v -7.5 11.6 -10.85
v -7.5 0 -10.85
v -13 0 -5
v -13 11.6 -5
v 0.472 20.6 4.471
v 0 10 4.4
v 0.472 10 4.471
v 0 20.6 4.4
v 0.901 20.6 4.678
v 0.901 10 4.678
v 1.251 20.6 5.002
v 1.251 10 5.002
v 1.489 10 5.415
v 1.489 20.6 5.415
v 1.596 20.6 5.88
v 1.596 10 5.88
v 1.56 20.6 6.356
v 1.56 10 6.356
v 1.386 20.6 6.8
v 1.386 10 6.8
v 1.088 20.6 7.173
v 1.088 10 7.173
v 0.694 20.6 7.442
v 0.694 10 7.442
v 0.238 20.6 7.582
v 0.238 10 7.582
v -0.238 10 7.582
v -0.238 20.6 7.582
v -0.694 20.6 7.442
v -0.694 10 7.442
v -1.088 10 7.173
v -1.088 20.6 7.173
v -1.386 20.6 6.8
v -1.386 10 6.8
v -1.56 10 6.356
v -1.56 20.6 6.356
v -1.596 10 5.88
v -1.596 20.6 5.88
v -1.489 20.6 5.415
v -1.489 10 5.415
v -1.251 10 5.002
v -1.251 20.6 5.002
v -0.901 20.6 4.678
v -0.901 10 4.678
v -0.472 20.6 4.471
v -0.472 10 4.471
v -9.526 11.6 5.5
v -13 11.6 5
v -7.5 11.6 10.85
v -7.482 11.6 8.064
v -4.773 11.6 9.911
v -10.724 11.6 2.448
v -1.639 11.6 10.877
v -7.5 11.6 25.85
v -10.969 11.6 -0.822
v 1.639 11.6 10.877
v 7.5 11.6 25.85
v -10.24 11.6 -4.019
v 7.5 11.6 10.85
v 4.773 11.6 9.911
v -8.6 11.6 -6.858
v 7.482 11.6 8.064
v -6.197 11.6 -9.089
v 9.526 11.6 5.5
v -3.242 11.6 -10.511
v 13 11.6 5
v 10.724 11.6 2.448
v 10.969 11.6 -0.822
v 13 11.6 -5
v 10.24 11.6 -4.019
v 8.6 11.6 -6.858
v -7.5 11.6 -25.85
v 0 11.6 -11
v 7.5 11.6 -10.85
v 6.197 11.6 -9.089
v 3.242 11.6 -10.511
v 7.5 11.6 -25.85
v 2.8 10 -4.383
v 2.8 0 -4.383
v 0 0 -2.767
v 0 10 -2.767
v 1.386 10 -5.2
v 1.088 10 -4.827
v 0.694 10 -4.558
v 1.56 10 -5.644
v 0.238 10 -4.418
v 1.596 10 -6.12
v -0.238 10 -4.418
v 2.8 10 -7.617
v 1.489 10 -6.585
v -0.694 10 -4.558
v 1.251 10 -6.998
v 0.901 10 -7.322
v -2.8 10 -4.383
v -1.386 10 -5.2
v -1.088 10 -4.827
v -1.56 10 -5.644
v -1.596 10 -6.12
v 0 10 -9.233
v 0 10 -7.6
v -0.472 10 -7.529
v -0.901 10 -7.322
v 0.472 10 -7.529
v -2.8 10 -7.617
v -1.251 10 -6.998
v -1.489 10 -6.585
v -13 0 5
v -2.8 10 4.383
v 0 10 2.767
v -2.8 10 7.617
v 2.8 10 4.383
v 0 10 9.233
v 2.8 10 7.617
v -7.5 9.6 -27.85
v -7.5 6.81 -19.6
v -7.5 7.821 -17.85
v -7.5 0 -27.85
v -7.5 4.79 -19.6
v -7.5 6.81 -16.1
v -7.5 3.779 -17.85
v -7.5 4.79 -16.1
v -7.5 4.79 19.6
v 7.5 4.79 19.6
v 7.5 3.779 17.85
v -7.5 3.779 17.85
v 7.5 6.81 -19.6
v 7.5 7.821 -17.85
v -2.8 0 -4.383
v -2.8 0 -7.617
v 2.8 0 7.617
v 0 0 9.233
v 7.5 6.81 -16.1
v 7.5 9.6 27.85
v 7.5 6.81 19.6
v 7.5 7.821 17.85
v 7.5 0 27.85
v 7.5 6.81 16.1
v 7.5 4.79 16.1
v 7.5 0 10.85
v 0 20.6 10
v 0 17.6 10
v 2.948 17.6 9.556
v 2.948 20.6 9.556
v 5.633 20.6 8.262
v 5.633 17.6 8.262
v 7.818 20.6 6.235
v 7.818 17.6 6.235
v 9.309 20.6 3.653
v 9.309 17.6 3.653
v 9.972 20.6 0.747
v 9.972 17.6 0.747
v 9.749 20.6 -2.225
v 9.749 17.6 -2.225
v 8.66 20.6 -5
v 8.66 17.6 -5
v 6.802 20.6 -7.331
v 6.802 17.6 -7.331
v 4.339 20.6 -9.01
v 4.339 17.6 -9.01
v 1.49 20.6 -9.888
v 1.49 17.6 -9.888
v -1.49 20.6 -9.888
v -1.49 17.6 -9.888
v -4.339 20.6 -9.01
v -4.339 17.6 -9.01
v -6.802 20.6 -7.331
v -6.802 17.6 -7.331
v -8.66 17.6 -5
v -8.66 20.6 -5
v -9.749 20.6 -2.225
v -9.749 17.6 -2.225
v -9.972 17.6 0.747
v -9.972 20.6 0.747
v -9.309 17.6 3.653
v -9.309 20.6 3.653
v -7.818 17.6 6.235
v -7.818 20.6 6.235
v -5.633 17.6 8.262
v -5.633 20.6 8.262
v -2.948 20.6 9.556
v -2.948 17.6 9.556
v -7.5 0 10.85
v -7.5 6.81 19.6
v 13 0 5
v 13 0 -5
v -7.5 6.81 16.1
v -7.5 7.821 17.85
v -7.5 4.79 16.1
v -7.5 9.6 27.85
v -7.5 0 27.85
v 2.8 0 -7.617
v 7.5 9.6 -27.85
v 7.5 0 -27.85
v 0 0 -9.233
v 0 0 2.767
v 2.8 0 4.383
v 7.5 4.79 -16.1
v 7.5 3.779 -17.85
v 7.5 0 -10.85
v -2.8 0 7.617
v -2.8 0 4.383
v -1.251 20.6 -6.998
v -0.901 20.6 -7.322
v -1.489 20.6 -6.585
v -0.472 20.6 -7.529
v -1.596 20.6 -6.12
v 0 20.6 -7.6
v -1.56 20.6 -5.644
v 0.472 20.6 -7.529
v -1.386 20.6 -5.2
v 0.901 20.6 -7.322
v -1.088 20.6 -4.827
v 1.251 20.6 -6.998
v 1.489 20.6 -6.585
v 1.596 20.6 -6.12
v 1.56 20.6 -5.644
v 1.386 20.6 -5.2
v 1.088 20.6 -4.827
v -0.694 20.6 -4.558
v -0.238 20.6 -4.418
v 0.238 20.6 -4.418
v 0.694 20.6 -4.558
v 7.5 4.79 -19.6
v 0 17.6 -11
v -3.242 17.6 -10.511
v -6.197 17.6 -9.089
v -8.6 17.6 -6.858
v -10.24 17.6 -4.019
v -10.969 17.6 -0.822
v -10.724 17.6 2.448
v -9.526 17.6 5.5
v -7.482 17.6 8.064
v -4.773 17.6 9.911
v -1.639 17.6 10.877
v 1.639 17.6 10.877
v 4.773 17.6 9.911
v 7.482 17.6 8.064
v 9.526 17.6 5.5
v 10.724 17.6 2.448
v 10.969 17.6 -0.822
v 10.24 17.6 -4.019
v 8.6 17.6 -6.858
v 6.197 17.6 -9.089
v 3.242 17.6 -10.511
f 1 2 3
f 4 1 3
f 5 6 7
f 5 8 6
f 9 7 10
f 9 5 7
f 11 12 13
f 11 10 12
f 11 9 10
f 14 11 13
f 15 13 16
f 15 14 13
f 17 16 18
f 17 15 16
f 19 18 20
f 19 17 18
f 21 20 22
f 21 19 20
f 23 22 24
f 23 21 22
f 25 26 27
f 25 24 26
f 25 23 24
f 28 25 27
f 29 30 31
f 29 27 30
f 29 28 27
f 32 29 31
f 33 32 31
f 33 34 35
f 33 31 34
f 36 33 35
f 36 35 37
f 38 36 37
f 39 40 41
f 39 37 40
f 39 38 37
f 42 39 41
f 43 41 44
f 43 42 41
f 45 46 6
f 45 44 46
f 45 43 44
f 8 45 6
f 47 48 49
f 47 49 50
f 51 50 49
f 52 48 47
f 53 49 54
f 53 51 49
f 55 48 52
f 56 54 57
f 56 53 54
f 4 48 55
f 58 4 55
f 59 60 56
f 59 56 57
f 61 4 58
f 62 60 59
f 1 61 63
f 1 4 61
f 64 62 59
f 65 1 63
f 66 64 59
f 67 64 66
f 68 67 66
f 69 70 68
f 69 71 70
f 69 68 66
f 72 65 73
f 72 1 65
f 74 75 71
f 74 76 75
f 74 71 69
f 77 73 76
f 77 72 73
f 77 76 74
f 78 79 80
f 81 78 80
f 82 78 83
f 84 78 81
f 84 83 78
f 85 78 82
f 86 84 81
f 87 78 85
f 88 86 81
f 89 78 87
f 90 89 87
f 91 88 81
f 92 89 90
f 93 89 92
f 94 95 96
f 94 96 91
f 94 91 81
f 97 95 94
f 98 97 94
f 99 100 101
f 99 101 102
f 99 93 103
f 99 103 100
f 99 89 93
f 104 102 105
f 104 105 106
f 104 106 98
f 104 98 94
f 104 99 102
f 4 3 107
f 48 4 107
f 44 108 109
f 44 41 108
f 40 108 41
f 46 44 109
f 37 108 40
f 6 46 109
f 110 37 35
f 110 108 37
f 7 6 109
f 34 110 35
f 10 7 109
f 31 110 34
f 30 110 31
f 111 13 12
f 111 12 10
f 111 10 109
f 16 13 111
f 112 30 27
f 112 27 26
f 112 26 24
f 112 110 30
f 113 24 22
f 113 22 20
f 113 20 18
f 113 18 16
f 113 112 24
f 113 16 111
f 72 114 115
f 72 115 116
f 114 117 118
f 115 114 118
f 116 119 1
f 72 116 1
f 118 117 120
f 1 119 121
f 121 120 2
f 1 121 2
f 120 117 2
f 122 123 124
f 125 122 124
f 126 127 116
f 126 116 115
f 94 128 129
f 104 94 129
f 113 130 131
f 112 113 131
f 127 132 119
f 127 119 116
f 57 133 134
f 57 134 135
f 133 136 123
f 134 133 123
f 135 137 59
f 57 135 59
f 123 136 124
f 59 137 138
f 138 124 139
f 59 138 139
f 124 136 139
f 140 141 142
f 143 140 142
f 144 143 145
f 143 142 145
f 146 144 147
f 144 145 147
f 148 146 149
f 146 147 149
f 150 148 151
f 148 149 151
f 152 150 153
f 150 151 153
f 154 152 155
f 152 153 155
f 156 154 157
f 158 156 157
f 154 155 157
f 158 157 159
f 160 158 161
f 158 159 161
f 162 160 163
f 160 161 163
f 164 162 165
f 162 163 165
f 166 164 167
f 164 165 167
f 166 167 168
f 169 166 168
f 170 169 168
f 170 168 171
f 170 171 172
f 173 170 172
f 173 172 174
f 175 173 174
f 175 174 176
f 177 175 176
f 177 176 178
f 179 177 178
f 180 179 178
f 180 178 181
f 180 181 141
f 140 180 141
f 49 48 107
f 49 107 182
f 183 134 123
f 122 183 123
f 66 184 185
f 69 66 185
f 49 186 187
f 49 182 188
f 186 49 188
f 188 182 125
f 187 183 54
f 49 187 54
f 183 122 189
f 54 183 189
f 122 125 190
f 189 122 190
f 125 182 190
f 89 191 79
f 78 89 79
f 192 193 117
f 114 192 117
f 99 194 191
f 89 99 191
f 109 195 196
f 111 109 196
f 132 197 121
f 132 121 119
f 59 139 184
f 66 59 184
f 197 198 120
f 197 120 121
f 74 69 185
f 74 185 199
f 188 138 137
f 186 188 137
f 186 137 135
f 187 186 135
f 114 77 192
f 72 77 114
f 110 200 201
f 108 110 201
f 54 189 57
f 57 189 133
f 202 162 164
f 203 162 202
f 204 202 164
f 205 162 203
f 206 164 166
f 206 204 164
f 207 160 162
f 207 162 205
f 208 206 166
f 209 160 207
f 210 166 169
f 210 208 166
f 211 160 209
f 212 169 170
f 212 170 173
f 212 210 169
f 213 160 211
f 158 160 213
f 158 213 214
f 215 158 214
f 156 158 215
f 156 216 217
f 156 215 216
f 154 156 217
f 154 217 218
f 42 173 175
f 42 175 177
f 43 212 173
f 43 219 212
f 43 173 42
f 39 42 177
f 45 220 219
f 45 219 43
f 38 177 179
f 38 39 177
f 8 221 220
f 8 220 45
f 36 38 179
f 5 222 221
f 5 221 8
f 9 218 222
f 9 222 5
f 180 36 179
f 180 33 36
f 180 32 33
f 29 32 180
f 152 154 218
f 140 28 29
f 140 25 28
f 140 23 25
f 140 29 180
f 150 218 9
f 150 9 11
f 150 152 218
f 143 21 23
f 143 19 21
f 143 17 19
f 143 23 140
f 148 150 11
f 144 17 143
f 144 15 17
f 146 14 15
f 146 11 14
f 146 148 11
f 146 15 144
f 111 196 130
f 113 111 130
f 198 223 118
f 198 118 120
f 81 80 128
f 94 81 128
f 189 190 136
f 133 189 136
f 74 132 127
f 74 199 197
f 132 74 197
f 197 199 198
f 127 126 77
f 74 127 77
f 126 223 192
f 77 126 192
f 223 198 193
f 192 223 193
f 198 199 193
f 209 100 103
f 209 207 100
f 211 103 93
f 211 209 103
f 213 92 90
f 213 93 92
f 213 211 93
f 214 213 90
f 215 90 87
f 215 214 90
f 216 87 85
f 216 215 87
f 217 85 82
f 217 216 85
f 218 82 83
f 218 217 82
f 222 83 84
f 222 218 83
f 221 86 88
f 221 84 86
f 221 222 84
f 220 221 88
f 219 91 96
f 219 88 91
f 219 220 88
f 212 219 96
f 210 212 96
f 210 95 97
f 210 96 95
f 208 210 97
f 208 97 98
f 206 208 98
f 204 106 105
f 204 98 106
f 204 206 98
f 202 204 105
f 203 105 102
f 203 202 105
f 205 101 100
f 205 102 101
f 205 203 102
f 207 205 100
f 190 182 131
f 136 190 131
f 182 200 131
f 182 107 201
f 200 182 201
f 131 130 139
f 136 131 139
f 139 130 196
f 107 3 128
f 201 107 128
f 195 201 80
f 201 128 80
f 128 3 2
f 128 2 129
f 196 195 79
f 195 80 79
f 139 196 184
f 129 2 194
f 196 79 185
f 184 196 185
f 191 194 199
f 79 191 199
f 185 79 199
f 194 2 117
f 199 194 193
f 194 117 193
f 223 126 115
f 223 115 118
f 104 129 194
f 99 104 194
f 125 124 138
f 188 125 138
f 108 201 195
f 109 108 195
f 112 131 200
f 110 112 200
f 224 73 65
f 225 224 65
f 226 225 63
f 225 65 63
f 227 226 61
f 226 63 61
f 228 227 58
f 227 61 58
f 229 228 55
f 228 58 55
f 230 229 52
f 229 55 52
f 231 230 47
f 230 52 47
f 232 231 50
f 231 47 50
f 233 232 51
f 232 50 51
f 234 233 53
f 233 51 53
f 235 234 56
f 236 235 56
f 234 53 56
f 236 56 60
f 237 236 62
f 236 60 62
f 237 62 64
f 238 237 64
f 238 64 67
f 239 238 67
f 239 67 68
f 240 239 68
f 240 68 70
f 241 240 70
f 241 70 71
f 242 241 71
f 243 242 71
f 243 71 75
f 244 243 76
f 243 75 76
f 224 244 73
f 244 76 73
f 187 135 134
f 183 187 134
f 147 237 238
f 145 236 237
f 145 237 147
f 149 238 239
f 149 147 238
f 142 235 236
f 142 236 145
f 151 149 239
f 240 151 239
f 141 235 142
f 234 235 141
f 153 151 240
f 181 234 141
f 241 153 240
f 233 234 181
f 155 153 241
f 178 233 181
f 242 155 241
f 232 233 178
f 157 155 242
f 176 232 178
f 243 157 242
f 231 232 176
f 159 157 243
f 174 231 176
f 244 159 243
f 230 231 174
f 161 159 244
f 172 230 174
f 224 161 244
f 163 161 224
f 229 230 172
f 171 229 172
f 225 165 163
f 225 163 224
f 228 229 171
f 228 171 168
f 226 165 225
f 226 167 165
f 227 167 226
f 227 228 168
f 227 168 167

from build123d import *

# Parameters (mm, degrees)
BOSS_EXTRU_1_DEPTH           = 11.6
ESQUISSE2_R                  = 10
BOSS_EXTRU_2_DEPTH           = 9
ENL_V_MAT_EXTRU_1_DEPTH      = 37.999763513
ENL_V_MAT_EXTRU_1_DEPTH_BACK = 37.999763513
ESQUISSE3_R                  = 1.6
ENL_V_MAT_EXTRU_2_DEPTH      = 41.252111746
ENL_V_MAT_EXTRU_2_DEPTH_BACK = 41.252111746
CHANFREIN1_SIZE              = 2
ESQUISSE7_R                  = 11
ESQUISSE7_R_2                = 1.6
BOSS_EXTRU_3_DEPTH           = 6
ENL_V_MAT_EXTRU_3_DEPTH      = 10
R_P_TITION_CIRCULAIRE1_COUNT = 2


with BuildPart() as part:
    # Esquisse1 → Boss.-Extru.1 (new body)
    with BuildSketch(Plane(origin=(0, 0, 0), x_dir=(1, 0, 0), z_dir=(0, 1, 0))):
        Polygon((7.5, 27.85), (-7.5, 27.85), (-7.5, 10.85), (-13, 5), (-13, -5), (-7.5, -10.85), (-7.5, -27.85), (7.5, -27.85), (7.5, -10.85), (13, -5), (13, 5), (7.5, 10.85), align=None)
    extrude(amount=BOSS_EXTRU_1_DEPTH)

    # Esquisse2 → Boss.-Extru.2 (add)
    with BuildSketch(Plane(origin=(0, 11.6, 0), x_dir=(1, 0, 0), z_dir=(0, 1, 0))):
        with Locations(Location((0, 0, 0), (0, 0, 270))):
            Circle(ESQUISSE2_R)
    extrude(amount=BOSS_EXTRU_2_DEPTH)

    # Esquisse3 → Enlèv. mat.-Extru.1 (cut, two sides: drawn at the far end of the back side and taken through both)
    with BuildSketch(Plane.XZ.offset(-ENL_V_MAT_EXTRU_1_DEPTH_BACK)):
        with Locations(Location((0, 6, 0), (0, 0, 270))):
            Circle(ESQUISSE3_R)
        with Locations(Location((0, -6, 0), (0, 0, 270))):
            Circle(ESQUISSE3_R)
    extrude(amount=ENL_V_MAT_EXTRU_1_DEPTH + ENL_V_MAT_EXTRU_1_DEPTH_BACK, mode=Mode.SUBTRACT)

    # Esquisse6 → Enlèv. mat.-Extru.2 (cut, two sides: drawn at the far end of the back side and taken through both)
    with BuildSketch(Plane.ZY.offset(7.5).offset(-ENL_V_MAT_EXTRU_2_DEPTH_BACK)):
        Polygon((16.1, 6.810362971), (17.85, 7.820725942), (19.6, 6.810362971), (19.6, 4.789637029), (17.85, 3.779274058), (16.1, 4.789637029), align=None)
        Polygon((-17.85, 7.820725942), (-19.6, 6.810362971), (-19.6, 4.789637029), (-17.85, 3.779274058), (-16.1, 4.789637029), (-16.1, 6.810362971), align=None)
    extrude(amount=ENL_V_MAT_EXTRU_2_DEPTH + ENL_V_MAT_EXTRU_2_DEPTH_BACK, mode=Mode.SUBTRACT)

    # Chanfrein1
    chanfrein1_edges = [part.edges().sort_by_distance(p)[0] for p in [
        (0, 11.6, 27.85),
        (0, 11.6, -27.85),
    ]]
    chamfer(chanfrein1_edges, length=CHANFREIN1_SIZE)

    # Esquisse7 → Boss.-Extru.3 (add)
    with BuildSketch(Plane(origin=(0, 11.6, 0), x_dir=(1, 0, 0), z_dir=(0, 1, 0))):
        with Locations(Location((0, 0, 0), (0, 0, 90))):
            Circle(ESQUISSE7_R)
        with Locations(Location((0, 6, 0), (0, 0, 90))):
            Circle(ESQUISSE7_R_2, mode=Mode.SUBTRACT)
        with Locations(Location((0, -6, 0), (0, 0, 90))):
            Circle(ESQUISSE7_R_2, mode=Mode.SUBTRACT)
    extrude(amount=BOSS_EXTRU_3_DEPTH)

    # Esquisse8 → Enlèv. mat.-Extru.3 (cut)
    with BuildSketch(Plane.XZ):
        Polygon((0, 9.233161507), (-2.8, 7.616580754), (-2.8, 4.383419246), (0, 2.766838493), (2.8, 4.383419246), (2.8, 7.616580754), align=None)
    enl_v_mat_extru_3 = extrude(amount=-ENL_V_MAT_EXTRU_3_DEPTH, mode=Mode.SUBTRACT)

    # Répétition circulaire1: Enlèv. mat.-Extru.3 ×2 about axis
    r_p_tition_circulaire1_axis = Axis((0, 0, 0), (0, 1, 0))
    for i in range(1, R_P_TITION_CIRCULAIRE1_COUNT):
        add(enl_v_mat_extru_3.rotate(r_p_tition_circulaire1_axis, i * 360 / R_P_TITION_CIRCULAIRE1_COUNT), mode=Mode.SUBTRACT)


solid = part.part
